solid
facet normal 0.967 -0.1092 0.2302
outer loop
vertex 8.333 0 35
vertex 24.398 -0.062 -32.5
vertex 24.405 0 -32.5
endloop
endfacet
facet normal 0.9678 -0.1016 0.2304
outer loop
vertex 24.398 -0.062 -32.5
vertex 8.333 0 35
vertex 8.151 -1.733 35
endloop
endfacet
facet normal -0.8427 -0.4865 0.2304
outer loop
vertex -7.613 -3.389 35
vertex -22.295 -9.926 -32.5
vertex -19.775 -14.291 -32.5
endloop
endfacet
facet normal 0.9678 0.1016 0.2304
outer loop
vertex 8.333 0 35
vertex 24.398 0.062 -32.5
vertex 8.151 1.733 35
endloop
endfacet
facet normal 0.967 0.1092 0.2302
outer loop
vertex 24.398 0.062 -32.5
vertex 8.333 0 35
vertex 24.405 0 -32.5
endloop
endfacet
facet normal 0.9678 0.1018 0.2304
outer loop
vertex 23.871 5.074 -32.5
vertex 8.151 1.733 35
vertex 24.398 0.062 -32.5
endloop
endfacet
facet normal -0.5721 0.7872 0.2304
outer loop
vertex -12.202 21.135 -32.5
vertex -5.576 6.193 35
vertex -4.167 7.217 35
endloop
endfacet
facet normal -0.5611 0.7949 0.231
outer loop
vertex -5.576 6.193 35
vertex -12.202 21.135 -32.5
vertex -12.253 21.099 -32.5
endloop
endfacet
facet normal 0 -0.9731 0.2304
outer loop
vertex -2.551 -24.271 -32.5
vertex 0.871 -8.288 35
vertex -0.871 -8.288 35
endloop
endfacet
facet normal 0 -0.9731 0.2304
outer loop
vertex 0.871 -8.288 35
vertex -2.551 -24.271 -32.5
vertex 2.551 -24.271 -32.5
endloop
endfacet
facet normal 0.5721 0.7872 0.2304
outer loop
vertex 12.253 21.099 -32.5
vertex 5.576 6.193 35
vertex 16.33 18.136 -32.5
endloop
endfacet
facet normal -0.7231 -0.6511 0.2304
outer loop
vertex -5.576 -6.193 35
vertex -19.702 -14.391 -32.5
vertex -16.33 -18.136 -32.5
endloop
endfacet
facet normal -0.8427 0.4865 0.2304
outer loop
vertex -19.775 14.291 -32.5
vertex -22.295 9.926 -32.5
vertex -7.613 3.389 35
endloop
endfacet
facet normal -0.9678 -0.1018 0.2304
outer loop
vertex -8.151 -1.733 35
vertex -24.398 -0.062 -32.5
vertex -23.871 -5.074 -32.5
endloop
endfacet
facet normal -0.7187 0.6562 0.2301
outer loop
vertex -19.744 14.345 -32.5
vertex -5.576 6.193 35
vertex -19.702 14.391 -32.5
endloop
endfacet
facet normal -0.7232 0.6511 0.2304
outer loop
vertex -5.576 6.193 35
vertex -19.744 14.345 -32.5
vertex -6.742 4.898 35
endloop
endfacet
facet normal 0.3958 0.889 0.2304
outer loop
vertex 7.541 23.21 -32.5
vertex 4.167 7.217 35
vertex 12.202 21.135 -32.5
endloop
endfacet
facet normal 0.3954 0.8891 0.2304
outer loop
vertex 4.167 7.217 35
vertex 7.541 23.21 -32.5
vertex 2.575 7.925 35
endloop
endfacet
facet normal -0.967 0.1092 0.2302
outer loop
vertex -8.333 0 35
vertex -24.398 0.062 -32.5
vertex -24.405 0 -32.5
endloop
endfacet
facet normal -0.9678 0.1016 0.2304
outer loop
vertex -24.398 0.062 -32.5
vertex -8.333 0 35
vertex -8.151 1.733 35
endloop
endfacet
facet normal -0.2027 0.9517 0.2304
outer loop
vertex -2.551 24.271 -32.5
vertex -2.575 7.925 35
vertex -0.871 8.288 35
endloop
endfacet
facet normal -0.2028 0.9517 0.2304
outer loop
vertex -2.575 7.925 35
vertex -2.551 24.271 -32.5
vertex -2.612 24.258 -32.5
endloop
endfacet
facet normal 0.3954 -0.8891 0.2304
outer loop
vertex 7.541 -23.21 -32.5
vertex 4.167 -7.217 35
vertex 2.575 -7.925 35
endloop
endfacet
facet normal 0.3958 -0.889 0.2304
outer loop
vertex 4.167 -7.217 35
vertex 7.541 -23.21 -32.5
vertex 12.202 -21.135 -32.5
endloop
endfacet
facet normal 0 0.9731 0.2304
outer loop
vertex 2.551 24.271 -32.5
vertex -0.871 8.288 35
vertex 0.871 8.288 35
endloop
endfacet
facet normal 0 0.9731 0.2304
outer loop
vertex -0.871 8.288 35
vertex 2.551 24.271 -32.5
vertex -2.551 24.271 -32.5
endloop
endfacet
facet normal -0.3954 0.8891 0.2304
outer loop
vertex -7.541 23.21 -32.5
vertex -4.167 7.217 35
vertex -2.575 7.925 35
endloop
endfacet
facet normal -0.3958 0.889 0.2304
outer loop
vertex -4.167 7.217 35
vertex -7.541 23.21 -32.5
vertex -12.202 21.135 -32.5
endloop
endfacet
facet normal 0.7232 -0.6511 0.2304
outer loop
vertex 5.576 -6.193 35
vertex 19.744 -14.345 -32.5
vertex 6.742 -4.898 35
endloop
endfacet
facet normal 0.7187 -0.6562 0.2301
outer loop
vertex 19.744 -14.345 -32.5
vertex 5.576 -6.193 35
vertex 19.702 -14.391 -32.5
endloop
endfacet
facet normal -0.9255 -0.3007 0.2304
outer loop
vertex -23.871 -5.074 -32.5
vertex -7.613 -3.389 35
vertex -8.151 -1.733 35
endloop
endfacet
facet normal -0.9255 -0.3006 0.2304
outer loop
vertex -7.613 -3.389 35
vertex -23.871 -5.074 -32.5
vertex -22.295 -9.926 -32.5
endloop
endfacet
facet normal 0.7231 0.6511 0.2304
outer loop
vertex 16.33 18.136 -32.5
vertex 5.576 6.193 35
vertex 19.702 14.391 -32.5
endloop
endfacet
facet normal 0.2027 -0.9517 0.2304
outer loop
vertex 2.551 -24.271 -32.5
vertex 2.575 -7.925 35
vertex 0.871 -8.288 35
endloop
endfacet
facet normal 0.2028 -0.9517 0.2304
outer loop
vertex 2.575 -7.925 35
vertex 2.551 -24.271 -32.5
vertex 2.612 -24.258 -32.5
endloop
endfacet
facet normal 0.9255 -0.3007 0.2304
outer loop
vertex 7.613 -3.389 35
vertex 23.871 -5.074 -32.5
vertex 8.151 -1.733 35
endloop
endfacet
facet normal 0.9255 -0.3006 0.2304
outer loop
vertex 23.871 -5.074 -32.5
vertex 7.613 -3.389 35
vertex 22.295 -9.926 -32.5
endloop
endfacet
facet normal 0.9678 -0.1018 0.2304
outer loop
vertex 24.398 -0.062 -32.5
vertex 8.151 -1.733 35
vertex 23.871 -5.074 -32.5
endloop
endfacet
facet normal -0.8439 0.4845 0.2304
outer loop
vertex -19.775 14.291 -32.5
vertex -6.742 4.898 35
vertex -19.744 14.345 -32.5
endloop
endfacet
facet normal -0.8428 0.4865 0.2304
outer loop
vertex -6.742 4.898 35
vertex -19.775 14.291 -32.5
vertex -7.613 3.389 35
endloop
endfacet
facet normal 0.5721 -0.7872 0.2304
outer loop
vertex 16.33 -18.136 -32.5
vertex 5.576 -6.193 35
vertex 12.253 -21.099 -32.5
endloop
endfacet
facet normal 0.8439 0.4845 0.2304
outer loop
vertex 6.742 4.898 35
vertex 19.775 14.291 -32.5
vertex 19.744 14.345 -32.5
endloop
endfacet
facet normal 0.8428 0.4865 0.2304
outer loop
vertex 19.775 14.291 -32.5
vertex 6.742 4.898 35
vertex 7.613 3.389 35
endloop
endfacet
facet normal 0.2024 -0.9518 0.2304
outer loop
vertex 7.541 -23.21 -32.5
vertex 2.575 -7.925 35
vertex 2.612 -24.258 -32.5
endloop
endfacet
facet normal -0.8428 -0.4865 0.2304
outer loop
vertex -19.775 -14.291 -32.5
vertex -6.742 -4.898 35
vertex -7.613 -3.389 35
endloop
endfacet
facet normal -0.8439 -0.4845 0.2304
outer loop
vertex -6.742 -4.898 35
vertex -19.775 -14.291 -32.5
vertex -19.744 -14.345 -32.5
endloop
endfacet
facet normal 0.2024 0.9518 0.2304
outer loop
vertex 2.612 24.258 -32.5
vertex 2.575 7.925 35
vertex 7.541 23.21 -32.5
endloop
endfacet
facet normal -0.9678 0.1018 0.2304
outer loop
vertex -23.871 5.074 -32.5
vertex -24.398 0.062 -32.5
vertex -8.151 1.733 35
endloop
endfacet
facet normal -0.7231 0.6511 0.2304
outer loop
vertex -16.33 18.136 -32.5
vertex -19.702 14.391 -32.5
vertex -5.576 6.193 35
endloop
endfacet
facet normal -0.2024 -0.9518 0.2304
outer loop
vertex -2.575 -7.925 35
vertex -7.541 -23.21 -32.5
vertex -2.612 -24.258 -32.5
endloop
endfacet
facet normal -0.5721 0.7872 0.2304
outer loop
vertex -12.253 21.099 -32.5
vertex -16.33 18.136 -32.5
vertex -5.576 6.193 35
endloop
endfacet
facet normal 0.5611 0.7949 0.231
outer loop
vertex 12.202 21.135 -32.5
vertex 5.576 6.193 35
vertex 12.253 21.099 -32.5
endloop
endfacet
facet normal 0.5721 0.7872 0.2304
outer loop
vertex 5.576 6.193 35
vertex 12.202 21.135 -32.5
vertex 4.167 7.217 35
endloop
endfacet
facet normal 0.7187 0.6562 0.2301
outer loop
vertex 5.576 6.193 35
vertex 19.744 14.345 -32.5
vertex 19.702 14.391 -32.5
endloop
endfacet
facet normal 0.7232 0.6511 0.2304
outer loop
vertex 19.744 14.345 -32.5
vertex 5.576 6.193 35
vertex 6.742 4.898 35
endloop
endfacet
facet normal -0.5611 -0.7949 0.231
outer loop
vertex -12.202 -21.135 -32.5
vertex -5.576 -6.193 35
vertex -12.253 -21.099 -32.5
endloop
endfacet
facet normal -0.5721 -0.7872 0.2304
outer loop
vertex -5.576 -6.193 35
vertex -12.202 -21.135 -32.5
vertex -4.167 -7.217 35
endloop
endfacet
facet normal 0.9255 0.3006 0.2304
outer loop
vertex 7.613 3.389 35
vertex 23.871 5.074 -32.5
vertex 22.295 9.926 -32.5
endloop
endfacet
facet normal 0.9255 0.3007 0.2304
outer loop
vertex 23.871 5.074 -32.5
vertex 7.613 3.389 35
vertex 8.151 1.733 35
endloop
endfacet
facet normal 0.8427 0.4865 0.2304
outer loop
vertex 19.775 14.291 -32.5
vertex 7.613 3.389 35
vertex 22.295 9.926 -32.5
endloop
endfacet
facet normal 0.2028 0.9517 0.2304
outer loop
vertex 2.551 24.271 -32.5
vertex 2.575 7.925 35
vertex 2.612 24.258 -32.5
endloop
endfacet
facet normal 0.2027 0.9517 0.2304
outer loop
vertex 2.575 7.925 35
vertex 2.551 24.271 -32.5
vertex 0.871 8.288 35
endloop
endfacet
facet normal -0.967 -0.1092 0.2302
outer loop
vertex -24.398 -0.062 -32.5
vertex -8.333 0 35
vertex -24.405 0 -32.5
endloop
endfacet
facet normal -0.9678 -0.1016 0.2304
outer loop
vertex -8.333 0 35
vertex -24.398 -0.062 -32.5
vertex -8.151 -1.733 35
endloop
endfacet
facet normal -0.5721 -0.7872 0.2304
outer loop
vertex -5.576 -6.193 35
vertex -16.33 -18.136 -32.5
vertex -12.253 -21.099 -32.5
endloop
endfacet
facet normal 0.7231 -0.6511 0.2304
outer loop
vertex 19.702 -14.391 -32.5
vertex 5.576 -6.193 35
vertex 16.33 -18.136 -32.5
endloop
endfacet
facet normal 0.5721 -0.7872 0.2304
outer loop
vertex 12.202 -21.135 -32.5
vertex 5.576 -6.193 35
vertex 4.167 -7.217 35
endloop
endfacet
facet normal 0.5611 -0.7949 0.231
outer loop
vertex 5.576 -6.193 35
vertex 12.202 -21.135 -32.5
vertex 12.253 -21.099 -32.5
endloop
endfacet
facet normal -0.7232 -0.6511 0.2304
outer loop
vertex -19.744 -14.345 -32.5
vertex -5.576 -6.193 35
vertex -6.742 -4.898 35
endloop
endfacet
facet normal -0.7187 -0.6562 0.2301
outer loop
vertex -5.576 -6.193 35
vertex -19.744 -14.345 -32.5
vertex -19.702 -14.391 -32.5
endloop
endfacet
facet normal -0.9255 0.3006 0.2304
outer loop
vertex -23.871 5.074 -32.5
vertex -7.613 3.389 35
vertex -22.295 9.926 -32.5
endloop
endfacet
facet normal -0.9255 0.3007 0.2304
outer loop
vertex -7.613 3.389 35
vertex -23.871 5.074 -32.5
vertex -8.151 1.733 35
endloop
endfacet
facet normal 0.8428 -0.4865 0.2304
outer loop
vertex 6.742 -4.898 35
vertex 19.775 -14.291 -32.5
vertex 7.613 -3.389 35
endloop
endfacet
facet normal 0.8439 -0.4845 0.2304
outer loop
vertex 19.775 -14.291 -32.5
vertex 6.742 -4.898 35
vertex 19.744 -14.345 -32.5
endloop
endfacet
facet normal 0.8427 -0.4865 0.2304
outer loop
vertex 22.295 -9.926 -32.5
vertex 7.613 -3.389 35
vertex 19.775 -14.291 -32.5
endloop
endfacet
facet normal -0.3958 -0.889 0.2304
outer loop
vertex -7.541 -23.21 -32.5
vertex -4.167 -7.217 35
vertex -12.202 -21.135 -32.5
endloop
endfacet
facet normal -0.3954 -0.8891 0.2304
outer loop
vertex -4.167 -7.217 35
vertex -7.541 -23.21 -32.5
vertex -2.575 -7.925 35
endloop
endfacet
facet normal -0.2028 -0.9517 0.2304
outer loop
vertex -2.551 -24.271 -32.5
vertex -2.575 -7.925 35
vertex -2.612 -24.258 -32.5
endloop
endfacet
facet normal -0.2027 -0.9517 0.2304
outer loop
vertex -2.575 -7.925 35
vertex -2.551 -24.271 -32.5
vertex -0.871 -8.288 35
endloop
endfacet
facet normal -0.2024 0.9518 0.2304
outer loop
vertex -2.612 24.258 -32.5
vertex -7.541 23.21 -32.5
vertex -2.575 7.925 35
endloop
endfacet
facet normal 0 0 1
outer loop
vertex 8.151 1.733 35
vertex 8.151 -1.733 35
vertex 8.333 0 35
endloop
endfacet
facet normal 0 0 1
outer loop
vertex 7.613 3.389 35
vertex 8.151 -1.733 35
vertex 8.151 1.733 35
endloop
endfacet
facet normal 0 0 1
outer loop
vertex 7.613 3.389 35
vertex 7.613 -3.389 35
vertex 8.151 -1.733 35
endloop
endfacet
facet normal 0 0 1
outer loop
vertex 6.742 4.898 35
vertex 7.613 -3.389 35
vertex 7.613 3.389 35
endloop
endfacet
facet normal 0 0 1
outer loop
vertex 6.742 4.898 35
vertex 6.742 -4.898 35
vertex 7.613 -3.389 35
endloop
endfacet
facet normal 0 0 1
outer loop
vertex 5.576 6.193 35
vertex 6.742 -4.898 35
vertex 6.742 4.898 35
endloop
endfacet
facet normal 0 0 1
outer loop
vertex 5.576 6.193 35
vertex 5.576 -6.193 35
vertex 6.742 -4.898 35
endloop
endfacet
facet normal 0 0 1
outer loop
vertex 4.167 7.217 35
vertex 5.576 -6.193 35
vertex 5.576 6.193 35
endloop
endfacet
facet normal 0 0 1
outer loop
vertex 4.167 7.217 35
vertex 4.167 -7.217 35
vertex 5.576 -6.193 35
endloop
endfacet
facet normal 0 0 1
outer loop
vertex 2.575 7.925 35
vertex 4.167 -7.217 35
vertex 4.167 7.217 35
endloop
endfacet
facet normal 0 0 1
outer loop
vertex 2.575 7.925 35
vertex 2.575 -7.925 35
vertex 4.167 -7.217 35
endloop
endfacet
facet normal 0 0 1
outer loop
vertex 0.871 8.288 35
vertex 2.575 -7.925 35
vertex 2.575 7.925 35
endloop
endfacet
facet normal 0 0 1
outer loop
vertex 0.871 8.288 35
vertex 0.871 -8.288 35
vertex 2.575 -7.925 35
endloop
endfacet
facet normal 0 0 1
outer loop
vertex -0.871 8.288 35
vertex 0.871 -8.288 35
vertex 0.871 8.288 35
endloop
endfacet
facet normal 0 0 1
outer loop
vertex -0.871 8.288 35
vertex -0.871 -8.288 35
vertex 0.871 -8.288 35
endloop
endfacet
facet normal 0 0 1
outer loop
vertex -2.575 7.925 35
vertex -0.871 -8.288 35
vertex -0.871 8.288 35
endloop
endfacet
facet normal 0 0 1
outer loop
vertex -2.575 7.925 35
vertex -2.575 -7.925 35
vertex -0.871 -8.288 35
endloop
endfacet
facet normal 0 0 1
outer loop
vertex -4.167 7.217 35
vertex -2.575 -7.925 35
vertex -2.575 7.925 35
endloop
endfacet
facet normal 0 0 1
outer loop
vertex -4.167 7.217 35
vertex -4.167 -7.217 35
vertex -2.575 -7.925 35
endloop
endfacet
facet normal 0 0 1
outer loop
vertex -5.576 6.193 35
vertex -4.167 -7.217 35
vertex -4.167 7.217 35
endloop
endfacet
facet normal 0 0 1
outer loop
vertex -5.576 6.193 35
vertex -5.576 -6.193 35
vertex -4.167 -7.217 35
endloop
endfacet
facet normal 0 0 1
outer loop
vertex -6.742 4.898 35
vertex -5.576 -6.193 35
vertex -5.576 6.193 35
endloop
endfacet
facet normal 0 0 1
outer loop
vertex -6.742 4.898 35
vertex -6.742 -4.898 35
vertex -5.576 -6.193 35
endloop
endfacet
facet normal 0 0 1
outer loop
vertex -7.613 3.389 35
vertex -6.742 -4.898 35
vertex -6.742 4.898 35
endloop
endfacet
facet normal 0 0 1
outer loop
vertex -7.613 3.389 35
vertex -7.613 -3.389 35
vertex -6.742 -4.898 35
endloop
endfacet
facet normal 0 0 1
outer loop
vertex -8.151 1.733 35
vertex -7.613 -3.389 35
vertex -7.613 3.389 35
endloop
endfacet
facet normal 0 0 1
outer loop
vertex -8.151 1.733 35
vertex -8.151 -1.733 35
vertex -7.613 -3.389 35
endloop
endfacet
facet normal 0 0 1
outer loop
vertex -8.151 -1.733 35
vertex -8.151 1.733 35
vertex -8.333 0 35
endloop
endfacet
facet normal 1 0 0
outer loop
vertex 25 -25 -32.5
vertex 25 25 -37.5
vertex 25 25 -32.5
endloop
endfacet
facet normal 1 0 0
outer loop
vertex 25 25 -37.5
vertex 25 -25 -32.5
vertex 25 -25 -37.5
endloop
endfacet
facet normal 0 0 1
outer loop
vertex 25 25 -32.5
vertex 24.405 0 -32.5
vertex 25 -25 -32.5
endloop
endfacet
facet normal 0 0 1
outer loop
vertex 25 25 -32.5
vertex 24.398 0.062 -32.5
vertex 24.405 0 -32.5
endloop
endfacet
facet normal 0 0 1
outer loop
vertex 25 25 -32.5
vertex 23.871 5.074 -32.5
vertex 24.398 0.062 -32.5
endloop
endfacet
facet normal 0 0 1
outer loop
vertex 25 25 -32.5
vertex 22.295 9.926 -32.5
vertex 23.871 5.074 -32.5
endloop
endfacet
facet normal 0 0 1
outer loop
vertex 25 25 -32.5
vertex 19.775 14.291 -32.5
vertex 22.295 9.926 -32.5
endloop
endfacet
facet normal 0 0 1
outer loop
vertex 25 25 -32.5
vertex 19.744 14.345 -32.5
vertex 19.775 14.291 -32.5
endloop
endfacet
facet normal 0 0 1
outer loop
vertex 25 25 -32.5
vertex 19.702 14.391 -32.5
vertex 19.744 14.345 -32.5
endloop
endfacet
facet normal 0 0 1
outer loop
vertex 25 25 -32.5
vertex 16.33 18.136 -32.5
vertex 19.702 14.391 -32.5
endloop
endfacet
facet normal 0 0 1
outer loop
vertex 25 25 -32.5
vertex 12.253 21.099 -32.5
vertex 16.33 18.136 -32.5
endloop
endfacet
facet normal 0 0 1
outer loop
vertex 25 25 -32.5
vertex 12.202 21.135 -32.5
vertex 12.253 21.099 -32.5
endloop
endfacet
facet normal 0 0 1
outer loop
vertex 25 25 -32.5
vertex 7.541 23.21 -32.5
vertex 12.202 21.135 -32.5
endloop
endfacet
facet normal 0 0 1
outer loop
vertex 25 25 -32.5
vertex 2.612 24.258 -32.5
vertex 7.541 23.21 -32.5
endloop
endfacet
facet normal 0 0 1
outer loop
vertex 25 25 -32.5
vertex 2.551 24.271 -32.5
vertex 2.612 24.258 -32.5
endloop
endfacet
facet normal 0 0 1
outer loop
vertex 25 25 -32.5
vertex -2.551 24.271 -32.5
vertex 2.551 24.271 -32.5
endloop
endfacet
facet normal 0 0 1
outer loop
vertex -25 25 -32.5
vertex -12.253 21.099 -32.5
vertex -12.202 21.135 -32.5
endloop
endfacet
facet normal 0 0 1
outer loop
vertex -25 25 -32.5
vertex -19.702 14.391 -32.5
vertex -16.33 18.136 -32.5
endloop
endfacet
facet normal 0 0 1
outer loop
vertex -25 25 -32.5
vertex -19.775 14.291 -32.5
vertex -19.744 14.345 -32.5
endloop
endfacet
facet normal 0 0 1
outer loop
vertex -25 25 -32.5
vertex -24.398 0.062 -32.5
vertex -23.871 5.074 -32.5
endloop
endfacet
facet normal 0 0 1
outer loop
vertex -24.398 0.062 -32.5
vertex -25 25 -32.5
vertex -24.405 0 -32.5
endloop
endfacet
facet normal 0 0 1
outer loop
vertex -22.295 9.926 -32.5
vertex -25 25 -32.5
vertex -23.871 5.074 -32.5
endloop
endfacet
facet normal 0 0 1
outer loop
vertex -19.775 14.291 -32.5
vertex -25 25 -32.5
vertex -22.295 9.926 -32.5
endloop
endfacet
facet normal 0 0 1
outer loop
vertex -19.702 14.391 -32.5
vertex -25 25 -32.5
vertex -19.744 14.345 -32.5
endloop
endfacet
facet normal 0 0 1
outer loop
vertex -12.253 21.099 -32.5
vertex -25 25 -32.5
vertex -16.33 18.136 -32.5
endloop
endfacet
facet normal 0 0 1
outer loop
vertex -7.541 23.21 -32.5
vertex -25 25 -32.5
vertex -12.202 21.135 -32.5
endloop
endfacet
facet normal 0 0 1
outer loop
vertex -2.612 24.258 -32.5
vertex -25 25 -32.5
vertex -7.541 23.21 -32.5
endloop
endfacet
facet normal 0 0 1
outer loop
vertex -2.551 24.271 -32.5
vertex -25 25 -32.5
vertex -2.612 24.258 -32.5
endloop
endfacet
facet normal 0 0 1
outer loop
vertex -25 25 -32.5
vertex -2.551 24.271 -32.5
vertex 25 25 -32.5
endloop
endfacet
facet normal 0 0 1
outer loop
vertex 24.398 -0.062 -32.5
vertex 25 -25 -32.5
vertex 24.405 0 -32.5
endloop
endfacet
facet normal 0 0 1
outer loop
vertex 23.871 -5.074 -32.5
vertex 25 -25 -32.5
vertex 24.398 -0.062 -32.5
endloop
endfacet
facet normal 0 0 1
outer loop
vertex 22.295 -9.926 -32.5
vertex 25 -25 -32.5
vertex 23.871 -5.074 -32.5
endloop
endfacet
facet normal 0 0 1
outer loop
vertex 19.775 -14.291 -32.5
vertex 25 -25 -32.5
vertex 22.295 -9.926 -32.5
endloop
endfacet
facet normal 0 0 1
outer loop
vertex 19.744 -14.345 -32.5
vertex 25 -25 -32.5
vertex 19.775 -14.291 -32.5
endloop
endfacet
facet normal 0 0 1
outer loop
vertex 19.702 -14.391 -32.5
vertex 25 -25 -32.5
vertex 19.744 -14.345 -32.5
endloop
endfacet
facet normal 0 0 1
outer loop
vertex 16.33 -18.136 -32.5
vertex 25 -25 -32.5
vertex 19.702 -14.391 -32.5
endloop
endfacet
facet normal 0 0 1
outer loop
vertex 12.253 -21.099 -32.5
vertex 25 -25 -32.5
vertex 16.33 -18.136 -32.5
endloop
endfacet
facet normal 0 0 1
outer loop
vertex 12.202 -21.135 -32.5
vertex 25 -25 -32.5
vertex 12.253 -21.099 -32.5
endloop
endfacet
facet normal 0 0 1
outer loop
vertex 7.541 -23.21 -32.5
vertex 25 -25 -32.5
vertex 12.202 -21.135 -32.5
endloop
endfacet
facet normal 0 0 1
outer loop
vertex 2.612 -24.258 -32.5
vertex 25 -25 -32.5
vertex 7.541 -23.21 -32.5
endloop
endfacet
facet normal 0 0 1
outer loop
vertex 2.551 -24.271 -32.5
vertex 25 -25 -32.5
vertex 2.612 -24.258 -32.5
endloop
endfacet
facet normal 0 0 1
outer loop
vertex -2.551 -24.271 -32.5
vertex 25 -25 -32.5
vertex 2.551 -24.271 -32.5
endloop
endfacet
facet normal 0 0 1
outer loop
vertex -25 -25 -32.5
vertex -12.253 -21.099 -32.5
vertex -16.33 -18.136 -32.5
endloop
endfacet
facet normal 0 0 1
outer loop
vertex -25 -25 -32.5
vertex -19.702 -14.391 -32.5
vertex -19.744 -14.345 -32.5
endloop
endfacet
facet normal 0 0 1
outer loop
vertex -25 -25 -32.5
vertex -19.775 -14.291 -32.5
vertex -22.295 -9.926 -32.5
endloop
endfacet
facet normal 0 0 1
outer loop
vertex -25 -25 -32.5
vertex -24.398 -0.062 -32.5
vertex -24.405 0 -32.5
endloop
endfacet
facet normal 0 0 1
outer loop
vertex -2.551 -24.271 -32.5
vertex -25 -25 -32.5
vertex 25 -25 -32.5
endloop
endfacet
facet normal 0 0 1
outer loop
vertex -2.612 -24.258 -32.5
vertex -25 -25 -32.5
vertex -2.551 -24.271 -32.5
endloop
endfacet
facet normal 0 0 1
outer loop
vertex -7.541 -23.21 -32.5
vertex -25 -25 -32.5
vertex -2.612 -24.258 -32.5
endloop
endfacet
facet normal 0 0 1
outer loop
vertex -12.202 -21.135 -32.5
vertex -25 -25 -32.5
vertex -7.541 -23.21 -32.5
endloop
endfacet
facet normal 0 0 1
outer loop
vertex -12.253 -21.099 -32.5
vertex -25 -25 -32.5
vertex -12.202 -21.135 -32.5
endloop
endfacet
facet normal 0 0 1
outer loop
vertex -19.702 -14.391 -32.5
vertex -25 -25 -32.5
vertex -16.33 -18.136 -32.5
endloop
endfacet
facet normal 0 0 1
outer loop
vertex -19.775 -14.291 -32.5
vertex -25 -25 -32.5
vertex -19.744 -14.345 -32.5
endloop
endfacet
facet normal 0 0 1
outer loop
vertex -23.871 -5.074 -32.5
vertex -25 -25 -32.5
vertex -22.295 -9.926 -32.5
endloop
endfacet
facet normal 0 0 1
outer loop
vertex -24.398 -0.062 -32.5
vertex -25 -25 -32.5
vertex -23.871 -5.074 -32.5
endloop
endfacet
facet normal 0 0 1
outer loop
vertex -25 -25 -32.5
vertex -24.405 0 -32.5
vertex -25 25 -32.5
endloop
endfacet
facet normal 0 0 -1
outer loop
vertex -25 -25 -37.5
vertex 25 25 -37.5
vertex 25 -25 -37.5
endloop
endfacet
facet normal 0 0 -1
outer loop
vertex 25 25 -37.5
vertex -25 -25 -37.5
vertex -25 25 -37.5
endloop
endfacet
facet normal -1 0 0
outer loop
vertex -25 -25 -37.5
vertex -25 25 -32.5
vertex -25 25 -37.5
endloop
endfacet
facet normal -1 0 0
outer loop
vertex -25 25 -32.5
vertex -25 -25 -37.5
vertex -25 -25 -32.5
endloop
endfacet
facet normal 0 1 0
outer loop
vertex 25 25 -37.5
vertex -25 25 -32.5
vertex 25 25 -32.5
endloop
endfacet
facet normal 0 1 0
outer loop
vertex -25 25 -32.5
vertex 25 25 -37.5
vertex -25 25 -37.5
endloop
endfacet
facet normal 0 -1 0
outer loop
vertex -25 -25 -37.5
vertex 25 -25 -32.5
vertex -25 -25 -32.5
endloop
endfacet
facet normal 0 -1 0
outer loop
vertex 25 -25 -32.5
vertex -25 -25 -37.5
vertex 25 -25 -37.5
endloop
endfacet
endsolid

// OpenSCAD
cone();
module cone(diameter = 25, height=70)
{   
    cylinder(height, diameter, diameter/3, true);
    translate([0,0,-height/2])cube([diameter*2,diameter*2,5], true);
}
